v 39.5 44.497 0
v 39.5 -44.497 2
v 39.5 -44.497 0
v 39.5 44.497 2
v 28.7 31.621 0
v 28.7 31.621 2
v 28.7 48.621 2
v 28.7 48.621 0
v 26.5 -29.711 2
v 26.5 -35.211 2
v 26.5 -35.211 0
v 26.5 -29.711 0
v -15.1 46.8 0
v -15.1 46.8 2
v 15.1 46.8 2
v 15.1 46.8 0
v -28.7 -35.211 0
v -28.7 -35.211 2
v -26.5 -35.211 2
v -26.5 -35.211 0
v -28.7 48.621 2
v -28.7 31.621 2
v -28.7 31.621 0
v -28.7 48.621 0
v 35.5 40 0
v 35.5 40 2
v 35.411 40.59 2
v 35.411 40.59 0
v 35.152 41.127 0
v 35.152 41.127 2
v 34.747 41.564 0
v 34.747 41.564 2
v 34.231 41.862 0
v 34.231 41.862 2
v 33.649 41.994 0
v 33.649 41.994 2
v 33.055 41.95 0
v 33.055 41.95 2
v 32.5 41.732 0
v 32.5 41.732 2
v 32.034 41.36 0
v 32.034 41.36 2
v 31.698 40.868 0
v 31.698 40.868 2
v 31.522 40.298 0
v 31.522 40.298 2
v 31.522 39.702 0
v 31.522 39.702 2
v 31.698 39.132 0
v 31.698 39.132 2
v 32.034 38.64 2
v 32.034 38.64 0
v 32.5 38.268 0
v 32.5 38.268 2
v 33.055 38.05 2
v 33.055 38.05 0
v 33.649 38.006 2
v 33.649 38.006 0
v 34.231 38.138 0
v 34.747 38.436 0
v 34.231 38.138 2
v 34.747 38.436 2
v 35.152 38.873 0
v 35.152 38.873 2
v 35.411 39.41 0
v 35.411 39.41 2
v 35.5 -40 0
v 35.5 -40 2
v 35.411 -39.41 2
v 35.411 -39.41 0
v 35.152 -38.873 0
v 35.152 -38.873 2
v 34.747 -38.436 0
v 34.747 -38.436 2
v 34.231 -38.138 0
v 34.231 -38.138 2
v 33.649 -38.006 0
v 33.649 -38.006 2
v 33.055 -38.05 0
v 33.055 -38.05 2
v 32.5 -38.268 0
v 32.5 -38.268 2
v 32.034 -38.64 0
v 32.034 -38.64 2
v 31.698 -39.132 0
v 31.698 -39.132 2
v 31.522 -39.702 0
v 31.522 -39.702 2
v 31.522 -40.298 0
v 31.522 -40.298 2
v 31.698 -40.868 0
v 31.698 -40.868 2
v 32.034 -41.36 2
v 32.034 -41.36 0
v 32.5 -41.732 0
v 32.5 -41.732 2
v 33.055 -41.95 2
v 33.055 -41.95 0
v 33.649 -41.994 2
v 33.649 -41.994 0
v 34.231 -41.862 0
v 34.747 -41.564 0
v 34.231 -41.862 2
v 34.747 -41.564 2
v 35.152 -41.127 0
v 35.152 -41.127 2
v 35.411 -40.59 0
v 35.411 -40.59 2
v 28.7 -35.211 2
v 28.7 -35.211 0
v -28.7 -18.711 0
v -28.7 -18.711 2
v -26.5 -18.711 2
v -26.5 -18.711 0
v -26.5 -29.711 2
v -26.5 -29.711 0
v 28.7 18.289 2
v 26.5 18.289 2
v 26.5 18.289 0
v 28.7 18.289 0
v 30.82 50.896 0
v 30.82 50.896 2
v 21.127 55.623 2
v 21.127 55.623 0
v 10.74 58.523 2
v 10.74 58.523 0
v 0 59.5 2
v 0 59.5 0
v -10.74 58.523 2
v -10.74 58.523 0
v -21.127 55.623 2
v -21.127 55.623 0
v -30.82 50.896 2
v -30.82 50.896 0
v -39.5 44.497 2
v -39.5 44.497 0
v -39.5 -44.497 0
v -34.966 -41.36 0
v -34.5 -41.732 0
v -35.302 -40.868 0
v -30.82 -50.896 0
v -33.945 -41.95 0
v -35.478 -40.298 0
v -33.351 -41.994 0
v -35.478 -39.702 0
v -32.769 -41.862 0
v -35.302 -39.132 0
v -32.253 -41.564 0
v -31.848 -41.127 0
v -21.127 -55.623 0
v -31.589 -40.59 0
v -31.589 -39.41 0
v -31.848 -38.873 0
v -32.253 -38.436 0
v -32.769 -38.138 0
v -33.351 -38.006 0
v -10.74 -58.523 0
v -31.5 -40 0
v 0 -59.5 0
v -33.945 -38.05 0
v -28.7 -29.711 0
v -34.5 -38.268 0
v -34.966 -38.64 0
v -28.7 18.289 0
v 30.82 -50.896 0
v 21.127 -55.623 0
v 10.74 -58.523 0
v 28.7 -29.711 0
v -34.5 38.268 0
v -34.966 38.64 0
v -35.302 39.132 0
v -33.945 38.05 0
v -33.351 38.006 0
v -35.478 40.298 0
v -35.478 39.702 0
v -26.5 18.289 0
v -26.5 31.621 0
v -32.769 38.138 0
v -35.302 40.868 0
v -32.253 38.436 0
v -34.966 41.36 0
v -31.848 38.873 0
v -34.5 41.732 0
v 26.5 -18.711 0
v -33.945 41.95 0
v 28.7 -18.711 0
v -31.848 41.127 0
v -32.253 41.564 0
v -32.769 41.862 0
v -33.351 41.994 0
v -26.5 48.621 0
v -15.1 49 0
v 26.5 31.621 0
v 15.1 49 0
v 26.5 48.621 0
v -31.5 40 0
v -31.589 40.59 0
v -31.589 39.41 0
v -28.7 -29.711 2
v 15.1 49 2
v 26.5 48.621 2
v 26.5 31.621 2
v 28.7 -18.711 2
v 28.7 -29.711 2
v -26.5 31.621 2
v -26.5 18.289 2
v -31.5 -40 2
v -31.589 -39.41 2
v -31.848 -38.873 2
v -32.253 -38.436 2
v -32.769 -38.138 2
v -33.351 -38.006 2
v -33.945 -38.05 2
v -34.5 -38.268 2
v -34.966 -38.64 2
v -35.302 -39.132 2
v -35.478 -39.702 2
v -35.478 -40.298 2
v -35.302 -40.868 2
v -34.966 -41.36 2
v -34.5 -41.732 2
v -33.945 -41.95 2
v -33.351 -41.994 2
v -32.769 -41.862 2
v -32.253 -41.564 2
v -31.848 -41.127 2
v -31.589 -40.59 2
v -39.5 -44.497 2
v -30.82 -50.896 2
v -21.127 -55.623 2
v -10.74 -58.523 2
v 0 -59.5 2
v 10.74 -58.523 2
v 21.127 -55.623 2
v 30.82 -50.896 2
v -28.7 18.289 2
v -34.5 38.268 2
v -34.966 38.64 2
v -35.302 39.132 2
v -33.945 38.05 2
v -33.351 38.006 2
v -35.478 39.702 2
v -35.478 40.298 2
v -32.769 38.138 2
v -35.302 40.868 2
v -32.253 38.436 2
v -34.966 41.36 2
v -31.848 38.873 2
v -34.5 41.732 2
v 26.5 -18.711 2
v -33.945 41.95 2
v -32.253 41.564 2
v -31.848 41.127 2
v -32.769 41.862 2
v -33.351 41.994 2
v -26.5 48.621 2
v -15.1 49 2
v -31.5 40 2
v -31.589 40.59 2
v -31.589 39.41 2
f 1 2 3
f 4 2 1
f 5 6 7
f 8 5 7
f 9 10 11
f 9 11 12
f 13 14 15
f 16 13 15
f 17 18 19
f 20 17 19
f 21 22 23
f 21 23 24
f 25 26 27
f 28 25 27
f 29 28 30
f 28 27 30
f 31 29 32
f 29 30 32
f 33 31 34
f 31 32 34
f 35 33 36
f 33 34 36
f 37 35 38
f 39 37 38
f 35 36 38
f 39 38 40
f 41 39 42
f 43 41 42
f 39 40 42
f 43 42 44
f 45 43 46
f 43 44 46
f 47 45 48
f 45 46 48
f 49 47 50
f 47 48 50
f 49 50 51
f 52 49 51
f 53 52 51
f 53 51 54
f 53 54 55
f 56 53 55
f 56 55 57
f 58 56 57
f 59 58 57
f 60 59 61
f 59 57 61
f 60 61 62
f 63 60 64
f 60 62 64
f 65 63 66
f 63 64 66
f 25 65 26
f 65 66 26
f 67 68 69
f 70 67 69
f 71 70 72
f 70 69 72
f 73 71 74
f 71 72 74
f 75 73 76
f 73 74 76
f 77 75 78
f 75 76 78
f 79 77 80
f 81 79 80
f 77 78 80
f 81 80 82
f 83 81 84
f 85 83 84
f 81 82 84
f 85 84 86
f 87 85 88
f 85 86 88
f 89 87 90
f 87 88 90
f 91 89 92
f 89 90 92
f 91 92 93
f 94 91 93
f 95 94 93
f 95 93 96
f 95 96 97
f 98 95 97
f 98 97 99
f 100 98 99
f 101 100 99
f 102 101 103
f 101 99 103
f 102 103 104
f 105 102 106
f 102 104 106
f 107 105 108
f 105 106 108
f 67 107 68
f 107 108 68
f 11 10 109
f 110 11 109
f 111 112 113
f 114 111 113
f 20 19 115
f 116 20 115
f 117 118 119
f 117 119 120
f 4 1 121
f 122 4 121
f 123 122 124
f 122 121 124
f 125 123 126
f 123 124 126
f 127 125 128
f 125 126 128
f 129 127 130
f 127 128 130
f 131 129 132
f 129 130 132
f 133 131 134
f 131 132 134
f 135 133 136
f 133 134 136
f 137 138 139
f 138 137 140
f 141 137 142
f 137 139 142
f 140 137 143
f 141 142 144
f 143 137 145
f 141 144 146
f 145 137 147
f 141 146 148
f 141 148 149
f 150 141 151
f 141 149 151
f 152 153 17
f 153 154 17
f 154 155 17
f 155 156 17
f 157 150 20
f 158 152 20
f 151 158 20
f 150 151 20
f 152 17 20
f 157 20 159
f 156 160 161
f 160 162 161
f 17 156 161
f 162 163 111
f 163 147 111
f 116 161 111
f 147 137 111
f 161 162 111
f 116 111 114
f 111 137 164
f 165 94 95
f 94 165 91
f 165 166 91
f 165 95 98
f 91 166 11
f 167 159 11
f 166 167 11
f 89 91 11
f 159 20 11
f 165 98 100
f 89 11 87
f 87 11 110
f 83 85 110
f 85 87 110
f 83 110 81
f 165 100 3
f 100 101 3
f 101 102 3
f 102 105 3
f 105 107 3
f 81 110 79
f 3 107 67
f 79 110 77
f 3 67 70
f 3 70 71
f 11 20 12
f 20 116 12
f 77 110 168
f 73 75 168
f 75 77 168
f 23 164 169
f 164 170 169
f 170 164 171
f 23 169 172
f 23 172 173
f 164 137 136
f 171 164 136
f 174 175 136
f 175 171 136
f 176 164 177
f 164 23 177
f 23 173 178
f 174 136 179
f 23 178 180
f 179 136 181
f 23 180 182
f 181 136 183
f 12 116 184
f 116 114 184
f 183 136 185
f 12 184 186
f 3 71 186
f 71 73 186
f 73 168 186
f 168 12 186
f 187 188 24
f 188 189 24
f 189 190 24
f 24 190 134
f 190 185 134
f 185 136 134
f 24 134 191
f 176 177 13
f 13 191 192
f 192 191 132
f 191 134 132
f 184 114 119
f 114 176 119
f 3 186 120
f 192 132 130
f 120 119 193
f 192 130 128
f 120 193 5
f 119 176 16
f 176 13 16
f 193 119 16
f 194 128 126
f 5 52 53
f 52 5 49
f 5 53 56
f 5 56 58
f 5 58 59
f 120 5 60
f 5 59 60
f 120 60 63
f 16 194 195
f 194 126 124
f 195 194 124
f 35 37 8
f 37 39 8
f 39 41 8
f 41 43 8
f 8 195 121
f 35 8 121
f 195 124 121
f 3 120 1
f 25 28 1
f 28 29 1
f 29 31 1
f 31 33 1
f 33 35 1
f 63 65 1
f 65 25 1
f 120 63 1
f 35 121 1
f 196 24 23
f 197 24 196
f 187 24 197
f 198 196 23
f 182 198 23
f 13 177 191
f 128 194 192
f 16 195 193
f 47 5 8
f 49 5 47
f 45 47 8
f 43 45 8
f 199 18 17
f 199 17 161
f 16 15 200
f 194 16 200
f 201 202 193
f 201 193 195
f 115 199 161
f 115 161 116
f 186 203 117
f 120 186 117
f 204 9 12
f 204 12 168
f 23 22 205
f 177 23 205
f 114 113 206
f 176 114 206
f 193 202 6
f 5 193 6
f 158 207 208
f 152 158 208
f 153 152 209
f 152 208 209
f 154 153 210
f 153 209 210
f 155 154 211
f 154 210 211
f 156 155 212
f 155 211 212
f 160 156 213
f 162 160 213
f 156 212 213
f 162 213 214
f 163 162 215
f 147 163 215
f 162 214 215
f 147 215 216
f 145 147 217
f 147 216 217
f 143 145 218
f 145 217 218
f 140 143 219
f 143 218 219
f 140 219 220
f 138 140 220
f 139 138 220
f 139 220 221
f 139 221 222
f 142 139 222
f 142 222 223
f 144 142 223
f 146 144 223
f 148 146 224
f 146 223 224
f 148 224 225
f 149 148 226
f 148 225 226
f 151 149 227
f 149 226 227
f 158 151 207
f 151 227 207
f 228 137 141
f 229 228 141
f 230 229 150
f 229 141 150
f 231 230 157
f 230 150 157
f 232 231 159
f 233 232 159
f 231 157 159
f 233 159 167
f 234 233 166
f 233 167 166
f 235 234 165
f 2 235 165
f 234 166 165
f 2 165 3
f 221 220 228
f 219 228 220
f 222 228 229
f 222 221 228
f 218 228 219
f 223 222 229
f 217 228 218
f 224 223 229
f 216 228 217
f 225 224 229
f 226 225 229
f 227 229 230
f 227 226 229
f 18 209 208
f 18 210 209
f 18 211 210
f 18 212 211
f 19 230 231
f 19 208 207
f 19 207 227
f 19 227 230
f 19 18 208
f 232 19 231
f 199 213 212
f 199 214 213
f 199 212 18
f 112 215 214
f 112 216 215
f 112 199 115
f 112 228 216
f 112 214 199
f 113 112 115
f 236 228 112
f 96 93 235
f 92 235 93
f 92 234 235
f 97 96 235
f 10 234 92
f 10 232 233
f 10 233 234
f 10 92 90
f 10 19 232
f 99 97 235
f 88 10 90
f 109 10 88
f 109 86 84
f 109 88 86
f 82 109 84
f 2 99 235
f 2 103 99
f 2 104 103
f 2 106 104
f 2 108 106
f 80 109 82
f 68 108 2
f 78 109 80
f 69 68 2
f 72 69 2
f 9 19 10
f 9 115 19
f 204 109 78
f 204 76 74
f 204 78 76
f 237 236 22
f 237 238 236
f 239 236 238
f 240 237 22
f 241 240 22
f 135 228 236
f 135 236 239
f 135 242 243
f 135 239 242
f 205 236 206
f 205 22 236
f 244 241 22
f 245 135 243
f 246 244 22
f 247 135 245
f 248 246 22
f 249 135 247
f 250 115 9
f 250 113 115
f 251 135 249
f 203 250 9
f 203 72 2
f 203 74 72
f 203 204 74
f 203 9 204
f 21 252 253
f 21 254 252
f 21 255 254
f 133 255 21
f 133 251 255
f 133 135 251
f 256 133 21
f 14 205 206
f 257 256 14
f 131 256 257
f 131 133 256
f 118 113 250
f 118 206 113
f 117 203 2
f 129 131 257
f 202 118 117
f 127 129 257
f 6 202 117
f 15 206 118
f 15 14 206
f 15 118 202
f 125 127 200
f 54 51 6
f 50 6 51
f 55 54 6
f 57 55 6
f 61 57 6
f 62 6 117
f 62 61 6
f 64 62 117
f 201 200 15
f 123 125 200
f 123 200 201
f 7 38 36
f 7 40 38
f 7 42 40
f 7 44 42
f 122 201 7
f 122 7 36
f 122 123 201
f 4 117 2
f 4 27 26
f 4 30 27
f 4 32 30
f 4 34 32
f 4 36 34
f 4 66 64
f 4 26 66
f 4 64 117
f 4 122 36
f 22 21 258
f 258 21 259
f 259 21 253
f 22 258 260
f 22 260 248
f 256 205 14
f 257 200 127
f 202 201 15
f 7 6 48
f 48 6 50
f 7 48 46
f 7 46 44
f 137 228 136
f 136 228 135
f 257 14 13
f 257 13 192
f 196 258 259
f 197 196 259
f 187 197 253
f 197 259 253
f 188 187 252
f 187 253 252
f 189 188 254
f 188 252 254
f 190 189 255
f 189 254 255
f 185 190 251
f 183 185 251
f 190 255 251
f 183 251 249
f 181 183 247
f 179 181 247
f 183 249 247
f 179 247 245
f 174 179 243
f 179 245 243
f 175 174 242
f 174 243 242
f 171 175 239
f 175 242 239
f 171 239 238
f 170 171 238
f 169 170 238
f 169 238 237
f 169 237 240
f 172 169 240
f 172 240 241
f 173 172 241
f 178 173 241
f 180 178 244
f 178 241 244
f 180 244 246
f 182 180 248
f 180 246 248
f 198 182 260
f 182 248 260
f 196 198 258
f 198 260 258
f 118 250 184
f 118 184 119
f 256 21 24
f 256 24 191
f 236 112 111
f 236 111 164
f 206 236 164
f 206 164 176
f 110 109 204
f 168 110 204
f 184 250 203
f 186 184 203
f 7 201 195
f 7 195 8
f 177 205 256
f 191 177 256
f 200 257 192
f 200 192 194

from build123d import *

# Parameters (mm, degrees)
SKIZZE1_R                       = 59.5
AUFSATZ_LINEAR_AUSTRAGEN1_DEPTH = 2
SKIZZE3_R                       = 2
SKIZZE3_W                       = 2.2
SKIZZE3_H                       = 37
SKIZZE3_H_2                     = 17
SKIZZE3_H_3                     = 5.5
SKIZZE3_W_2                     = 30.2
SKIZZE3_H_4                     = 2.2
SKIZZE3_W_3                     = 20
SKIZZE3_H_5                     = 88.994381846
SCHNITT_LINEAR_AUSTRAGEN7_DEPTH = 2


with BuildPart() as part:
    # Skizze1 → Aufsatz-Linear austragen1 (new body)
    with BuildSketch(Plane.XY):
        Circle(SKIZZE1_R)
    extrude(amount=AUFSATZ_LINEAR_AUSTRAGEN1_DEPTH)

    # Skizze3 → Schnitt-Linear austragen7 (cut)
    with BuildSketch(Plane.XY.offset(2)):
        with Locations((-33.5, 40)):
            Circle(SKIZZE3_R)
        with Locations((33.5, 40)):
            Circle(SKIZZE3_R)
        with Locations((33.5, -40)):
            Circle(SKIZZE3_R)
        with Locations((-33.5, -40)):
            Circle(SKIZZE3_R)
        with Locations((-27.6, -0.21138397)):
            Rectangle(SKIZZE3_W, SKIZZE3_H)
        with Locations((27.6, -0.21138397)):
            Rectangle(SKIZZE3_W, SKIZZE3_H)
        with Locations((-27.6, 40.120629313)):
            Rectangle(SKIZZE3_W, SKIZZE3_H_2)
        with Locations((27.6, 40.120629313)):
            Rectangle(SKIZZE3_W, SKIZZE3_H_2)
        with Locations((-27.6, -32.46138397)):
            Rectangle(SKIZZE3_W, SKIZZE3_H_3)
        with Locations((27.6, -32.46138397)):
            Rectangle(SKIZZE3_W, SKIZZE3_H_3)
        with Locations((0, 47.9)):
            Rectangle(SKIZZE3_W_2, SKIZZE3_H_4)
        with Locations((49.5, 0)):
            Rectangle(SKIZZE3_W_3, SKIZZE3_H_5)
        with Locations((-49.5, 0)):
            Rectangle(SKIZZE3_W_3, SKIZZE3_H_5)
    extrude(amount=-SCHNITT_LINEAR_AUSTRAGEN7_DEPTH, mode=Mode.SUBTRACT)


solid = part.part
